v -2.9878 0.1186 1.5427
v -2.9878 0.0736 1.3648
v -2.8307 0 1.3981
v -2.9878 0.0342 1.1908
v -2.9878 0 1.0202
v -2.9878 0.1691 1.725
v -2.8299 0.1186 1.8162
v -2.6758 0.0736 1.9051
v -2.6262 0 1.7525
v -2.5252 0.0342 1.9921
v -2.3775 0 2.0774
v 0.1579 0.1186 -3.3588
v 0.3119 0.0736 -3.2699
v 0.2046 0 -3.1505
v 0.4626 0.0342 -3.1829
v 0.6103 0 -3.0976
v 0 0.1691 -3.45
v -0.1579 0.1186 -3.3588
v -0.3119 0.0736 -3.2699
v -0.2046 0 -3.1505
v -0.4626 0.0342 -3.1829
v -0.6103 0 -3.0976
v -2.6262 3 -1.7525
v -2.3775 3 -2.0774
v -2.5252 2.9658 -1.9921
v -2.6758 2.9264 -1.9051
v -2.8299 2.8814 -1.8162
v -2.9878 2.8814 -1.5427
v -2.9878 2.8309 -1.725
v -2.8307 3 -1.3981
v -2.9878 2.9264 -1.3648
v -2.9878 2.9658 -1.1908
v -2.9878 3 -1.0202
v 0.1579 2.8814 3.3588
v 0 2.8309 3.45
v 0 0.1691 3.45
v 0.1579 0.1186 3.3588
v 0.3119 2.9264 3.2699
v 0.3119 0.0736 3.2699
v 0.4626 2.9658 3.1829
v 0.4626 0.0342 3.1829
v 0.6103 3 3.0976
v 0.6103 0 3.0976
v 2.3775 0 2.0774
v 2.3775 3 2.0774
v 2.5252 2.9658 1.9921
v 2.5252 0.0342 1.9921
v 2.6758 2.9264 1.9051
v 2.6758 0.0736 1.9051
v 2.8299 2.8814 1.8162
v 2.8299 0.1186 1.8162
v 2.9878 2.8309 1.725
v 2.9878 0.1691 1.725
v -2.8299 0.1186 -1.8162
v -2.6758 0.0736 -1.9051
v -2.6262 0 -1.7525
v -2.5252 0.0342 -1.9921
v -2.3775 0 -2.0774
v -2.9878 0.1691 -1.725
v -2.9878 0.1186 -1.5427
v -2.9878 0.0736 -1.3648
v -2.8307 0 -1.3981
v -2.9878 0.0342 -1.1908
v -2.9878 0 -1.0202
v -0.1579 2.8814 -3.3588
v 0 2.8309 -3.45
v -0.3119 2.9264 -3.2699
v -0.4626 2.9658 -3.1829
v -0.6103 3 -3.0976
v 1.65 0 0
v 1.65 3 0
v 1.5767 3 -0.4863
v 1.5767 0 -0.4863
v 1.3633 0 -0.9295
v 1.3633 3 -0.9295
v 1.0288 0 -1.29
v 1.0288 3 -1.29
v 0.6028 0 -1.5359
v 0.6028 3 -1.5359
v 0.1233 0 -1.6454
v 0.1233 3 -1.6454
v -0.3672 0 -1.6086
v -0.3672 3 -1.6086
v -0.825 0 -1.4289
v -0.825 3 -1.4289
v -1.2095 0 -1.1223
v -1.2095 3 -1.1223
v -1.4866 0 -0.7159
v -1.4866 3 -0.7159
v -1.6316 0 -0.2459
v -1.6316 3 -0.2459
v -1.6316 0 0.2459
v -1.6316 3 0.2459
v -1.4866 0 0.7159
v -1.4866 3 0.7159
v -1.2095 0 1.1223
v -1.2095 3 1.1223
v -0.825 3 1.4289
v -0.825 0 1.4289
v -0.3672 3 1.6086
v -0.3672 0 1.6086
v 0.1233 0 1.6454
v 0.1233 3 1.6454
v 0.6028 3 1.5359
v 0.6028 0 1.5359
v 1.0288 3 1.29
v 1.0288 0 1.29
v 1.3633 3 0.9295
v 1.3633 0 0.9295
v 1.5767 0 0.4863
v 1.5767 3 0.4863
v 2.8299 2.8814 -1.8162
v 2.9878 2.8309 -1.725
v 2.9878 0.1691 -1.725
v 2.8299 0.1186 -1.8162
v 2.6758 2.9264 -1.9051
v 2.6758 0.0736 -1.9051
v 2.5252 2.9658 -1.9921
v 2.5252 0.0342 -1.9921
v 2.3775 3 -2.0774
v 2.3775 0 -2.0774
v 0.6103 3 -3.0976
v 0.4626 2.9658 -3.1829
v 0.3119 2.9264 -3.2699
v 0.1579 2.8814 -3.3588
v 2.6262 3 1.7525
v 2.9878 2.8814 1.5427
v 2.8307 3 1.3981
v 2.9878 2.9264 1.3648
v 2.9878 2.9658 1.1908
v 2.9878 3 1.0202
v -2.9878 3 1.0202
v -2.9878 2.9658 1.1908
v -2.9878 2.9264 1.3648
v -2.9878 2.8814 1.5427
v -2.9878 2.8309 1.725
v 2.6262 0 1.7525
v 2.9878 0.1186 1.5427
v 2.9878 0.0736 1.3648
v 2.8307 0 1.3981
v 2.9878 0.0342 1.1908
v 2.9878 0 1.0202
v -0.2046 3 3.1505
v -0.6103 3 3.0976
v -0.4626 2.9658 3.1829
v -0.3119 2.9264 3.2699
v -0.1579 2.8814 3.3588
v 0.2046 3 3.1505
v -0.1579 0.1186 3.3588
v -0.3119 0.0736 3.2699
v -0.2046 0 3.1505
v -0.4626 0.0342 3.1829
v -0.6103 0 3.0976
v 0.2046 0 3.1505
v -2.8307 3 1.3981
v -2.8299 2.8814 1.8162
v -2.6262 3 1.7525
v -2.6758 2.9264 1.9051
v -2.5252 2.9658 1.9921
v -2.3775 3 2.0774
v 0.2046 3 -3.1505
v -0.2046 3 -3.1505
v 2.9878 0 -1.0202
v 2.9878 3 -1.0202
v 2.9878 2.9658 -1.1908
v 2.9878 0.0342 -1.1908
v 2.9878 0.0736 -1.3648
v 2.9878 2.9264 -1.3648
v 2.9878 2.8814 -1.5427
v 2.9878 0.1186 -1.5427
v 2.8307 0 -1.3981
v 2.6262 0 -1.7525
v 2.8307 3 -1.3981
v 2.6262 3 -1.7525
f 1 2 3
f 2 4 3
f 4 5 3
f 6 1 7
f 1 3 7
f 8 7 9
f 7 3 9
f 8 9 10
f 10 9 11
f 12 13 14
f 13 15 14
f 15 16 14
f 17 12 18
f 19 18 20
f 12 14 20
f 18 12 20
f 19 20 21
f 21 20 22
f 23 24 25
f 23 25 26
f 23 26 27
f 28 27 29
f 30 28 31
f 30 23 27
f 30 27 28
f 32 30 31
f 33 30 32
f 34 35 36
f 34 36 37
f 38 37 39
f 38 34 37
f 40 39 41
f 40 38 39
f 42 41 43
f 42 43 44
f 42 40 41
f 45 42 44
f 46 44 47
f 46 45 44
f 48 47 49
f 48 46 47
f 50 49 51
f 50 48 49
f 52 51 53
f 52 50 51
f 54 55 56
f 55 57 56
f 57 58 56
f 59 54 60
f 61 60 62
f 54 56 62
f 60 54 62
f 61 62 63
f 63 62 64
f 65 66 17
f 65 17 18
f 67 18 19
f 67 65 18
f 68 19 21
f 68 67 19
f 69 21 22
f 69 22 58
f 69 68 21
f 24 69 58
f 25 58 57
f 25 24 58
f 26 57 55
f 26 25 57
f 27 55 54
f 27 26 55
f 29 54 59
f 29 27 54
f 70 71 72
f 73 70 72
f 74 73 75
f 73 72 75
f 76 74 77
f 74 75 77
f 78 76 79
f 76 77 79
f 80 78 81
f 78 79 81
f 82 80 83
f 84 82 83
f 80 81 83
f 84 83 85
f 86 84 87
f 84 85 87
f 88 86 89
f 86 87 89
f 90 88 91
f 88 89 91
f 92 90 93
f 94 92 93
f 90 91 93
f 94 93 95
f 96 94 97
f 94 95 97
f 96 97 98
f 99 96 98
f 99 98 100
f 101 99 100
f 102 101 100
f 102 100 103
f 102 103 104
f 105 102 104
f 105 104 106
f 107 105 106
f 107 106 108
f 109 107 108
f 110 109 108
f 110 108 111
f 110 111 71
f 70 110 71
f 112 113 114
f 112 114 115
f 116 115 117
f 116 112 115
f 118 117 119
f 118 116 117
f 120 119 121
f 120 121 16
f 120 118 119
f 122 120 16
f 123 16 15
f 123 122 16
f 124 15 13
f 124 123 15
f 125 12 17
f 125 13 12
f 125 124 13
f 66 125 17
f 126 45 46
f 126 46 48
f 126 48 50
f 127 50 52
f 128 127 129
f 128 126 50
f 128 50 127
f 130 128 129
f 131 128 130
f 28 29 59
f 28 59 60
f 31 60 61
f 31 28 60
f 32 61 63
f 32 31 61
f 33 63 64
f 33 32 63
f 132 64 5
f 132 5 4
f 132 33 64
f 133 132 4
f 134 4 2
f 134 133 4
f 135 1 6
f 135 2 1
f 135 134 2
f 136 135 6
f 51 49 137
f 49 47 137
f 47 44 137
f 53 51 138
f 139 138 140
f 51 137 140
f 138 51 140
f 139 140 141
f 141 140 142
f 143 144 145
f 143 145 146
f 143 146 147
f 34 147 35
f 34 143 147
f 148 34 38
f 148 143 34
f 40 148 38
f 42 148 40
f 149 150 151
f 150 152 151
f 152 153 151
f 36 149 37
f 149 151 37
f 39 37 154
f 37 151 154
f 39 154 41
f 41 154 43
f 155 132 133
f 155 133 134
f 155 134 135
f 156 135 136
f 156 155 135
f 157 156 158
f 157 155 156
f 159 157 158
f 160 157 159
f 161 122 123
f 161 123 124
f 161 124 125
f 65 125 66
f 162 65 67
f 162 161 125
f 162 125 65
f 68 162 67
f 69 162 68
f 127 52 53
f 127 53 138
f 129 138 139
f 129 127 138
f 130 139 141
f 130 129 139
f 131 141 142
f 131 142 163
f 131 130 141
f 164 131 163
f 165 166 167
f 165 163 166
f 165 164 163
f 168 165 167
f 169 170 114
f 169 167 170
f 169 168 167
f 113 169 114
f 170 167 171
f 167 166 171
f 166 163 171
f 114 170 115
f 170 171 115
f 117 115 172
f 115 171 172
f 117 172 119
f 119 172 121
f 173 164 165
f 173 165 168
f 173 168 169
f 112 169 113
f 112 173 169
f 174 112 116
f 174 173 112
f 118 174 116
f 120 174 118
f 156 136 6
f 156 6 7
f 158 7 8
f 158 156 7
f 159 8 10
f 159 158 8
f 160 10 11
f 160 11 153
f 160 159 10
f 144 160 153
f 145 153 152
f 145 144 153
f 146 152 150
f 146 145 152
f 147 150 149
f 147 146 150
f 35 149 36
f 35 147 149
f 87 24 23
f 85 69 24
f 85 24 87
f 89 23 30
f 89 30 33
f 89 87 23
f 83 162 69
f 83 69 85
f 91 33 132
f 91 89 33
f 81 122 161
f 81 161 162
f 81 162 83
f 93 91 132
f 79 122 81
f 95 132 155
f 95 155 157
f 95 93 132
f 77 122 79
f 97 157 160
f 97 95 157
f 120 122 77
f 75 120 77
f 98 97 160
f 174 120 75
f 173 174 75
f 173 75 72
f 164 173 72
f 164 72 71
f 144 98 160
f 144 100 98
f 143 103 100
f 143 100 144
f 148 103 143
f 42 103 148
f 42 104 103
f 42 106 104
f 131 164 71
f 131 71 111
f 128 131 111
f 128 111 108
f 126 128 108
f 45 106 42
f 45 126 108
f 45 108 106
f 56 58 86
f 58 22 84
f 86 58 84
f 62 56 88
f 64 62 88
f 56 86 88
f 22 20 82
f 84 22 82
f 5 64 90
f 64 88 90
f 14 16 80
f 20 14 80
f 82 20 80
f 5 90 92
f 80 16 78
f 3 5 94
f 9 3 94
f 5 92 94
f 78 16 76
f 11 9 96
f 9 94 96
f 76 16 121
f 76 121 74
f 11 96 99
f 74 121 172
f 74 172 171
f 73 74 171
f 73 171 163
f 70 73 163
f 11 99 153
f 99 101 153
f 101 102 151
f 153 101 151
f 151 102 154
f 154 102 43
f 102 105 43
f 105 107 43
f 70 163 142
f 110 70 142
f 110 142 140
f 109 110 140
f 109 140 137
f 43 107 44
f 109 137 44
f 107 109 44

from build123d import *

# Parameters (mm, degrees)
SKETCH_1_R          = 3.85
EXTRUDE_1_DEPTH     = 3
CHAMFER_6_SIZE      = 0.4
CHAMFER_6_SIZE2     = 0.692820323
CHAMFER_7_SIZE      = 0.4
CHAMFER_7_SIZE2     = 0.692820323
SKETCH_3_OUTSIDE_W  = 11.96
SKETCH_3_OUTSIDE_H  = 11.96
CUT_EXTRUDE_4_DEPTH = 3
HOLE_WIZARD_M42_D   = 3.3


with BuildPart() as part:
    # Эскиз1 → Бобышка-Вытянуть1 (new body)
    with BuildSketch(Plane(origin=(0, 0, 0), x_dir=(1, 0, 0), z_dir=(0, 1, 0))):
        with Locations(Location((0, 0, 0), (0, 0, 270))):
            Circle(SKETCH_1_R)
    extrude(amount=EXTRUDE_1_DEPTH)

    # Фаска6
    chamfer_6_edges = [part.edges().sort_by_distance(p)[0] for p in [
        (0, 0, -3.85),
    ]]
    chamfer_6_side = [part.faces().sort_by_distance(p)[0] for p in [
        (0, 1.5, -3.85),
    ]]
    chamfer(chamfer_6_edges, length=CHAMFER_6_SIZE, length2=CHAMFER_6_SIZE2, reference=chamfer_6_side[0])

    # Фаска7
    chamfer_7_edges = [part.edges().sort_by_distance(p)[0] for p in [
        (0, 3, -3.85),
    ]]
    chamfer_7_side = [part.faces().sort_by_distance(p)[0] for p in [
        (0, 1.7, -3.85),
    ]]
    chamfer(chamfer_7_edges, length=CHAMFER_7_SIZE, length2=CHAMFER_7_SIZE2, reference=chamfer_7_side[0])

    # Эскиз3 outside → Вырез-Вытянуть4 (cut)
    with BuildSketch(Plane(origin=(0, 3, 0), x_dir=(1, 0, 0), z_dir=(0, 1, 0))):
        Rectangle(SKETCH_3_OUTSIDE_W, SKETCH_3_OUTSIDE_H)
        Polygon((2.987787643, -1.725), (2.987787643, 1.725), (0, 3.45), (-2.987787643, 1.725), (-2.987787643, -1.725), (0, -3.45), align=None, mode=Mode.SUBTRACT)
    extrude(amount=-CUT_EXTRUDE_4_DEPTH, mode=Mode.SUBTRACT)

    # Отверстие обработанное метчиком M42 (through all)
    with Locations(Plane(origin=(0, 0, 0), x_dir=(-1, 0, 0), z_dir=(0, -1, 0))):
        with Locations((0, 0)):
            Hole(HOLE_WIZARD_M42_D / 2)


solid = part.part
